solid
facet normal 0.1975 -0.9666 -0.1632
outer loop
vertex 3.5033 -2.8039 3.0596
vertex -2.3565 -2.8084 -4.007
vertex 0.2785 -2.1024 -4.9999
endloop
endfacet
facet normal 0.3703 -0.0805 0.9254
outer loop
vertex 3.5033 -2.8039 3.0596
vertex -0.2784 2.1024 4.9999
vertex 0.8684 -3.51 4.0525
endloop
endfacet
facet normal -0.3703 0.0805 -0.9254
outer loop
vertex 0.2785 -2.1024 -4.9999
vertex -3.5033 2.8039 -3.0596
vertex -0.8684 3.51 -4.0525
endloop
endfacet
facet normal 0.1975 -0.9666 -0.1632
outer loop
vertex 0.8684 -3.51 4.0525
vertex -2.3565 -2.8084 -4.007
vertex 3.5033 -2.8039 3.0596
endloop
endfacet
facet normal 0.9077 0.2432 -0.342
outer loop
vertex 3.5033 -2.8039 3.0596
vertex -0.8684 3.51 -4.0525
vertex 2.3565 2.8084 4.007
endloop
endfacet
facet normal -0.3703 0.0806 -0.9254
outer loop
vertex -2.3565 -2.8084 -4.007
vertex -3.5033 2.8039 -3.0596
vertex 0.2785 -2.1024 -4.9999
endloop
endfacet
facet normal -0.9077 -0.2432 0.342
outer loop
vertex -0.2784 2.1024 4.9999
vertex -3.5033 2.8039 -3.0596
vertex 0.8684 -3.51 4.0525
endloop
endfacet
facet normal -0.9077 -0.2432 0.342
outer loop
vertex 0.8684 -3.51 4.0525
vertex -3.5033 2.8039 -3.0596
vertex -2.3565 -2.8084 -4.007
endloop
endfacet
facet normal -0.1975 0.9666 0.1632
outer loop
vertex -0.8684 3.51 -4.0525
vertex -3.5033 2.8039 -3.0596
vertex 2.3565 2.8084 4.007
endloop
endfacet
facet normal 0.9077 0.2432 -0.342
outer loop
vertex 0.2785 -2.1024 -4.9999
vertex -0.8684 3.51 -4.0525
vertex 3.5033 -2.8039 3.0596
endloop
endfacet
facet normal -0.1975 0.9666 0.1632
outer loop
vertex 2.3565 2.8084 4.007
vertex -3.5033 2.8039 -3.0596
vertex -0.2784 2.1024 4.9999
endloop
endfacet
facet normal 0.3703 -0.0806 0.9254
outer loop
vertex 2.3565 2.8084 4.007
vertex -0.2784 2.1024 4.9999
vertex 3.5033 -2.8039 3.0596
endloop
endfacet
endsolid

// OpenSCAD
intersection() {
  translate([1e-05, -5e-06, 0])
  cube(size = [8.40808, 8.42389, 11.9999], center = true);

  union() {
    union() {
      translate([1.1932e-05, -2.80759e-06, 3.91507e-07])
      rotate([100, 20.0001, 15])
      cube(size = [2.90299, 8.70901, 5.80616], center = true);
    
      translate([1.1932e-05, -2.80759e-06, 3.91507e-07])
      rotate([100, 20.0001, 15])
      cube(size = [2.90299, 8.70901, 5.80616], center = true);
    }
  }
}
